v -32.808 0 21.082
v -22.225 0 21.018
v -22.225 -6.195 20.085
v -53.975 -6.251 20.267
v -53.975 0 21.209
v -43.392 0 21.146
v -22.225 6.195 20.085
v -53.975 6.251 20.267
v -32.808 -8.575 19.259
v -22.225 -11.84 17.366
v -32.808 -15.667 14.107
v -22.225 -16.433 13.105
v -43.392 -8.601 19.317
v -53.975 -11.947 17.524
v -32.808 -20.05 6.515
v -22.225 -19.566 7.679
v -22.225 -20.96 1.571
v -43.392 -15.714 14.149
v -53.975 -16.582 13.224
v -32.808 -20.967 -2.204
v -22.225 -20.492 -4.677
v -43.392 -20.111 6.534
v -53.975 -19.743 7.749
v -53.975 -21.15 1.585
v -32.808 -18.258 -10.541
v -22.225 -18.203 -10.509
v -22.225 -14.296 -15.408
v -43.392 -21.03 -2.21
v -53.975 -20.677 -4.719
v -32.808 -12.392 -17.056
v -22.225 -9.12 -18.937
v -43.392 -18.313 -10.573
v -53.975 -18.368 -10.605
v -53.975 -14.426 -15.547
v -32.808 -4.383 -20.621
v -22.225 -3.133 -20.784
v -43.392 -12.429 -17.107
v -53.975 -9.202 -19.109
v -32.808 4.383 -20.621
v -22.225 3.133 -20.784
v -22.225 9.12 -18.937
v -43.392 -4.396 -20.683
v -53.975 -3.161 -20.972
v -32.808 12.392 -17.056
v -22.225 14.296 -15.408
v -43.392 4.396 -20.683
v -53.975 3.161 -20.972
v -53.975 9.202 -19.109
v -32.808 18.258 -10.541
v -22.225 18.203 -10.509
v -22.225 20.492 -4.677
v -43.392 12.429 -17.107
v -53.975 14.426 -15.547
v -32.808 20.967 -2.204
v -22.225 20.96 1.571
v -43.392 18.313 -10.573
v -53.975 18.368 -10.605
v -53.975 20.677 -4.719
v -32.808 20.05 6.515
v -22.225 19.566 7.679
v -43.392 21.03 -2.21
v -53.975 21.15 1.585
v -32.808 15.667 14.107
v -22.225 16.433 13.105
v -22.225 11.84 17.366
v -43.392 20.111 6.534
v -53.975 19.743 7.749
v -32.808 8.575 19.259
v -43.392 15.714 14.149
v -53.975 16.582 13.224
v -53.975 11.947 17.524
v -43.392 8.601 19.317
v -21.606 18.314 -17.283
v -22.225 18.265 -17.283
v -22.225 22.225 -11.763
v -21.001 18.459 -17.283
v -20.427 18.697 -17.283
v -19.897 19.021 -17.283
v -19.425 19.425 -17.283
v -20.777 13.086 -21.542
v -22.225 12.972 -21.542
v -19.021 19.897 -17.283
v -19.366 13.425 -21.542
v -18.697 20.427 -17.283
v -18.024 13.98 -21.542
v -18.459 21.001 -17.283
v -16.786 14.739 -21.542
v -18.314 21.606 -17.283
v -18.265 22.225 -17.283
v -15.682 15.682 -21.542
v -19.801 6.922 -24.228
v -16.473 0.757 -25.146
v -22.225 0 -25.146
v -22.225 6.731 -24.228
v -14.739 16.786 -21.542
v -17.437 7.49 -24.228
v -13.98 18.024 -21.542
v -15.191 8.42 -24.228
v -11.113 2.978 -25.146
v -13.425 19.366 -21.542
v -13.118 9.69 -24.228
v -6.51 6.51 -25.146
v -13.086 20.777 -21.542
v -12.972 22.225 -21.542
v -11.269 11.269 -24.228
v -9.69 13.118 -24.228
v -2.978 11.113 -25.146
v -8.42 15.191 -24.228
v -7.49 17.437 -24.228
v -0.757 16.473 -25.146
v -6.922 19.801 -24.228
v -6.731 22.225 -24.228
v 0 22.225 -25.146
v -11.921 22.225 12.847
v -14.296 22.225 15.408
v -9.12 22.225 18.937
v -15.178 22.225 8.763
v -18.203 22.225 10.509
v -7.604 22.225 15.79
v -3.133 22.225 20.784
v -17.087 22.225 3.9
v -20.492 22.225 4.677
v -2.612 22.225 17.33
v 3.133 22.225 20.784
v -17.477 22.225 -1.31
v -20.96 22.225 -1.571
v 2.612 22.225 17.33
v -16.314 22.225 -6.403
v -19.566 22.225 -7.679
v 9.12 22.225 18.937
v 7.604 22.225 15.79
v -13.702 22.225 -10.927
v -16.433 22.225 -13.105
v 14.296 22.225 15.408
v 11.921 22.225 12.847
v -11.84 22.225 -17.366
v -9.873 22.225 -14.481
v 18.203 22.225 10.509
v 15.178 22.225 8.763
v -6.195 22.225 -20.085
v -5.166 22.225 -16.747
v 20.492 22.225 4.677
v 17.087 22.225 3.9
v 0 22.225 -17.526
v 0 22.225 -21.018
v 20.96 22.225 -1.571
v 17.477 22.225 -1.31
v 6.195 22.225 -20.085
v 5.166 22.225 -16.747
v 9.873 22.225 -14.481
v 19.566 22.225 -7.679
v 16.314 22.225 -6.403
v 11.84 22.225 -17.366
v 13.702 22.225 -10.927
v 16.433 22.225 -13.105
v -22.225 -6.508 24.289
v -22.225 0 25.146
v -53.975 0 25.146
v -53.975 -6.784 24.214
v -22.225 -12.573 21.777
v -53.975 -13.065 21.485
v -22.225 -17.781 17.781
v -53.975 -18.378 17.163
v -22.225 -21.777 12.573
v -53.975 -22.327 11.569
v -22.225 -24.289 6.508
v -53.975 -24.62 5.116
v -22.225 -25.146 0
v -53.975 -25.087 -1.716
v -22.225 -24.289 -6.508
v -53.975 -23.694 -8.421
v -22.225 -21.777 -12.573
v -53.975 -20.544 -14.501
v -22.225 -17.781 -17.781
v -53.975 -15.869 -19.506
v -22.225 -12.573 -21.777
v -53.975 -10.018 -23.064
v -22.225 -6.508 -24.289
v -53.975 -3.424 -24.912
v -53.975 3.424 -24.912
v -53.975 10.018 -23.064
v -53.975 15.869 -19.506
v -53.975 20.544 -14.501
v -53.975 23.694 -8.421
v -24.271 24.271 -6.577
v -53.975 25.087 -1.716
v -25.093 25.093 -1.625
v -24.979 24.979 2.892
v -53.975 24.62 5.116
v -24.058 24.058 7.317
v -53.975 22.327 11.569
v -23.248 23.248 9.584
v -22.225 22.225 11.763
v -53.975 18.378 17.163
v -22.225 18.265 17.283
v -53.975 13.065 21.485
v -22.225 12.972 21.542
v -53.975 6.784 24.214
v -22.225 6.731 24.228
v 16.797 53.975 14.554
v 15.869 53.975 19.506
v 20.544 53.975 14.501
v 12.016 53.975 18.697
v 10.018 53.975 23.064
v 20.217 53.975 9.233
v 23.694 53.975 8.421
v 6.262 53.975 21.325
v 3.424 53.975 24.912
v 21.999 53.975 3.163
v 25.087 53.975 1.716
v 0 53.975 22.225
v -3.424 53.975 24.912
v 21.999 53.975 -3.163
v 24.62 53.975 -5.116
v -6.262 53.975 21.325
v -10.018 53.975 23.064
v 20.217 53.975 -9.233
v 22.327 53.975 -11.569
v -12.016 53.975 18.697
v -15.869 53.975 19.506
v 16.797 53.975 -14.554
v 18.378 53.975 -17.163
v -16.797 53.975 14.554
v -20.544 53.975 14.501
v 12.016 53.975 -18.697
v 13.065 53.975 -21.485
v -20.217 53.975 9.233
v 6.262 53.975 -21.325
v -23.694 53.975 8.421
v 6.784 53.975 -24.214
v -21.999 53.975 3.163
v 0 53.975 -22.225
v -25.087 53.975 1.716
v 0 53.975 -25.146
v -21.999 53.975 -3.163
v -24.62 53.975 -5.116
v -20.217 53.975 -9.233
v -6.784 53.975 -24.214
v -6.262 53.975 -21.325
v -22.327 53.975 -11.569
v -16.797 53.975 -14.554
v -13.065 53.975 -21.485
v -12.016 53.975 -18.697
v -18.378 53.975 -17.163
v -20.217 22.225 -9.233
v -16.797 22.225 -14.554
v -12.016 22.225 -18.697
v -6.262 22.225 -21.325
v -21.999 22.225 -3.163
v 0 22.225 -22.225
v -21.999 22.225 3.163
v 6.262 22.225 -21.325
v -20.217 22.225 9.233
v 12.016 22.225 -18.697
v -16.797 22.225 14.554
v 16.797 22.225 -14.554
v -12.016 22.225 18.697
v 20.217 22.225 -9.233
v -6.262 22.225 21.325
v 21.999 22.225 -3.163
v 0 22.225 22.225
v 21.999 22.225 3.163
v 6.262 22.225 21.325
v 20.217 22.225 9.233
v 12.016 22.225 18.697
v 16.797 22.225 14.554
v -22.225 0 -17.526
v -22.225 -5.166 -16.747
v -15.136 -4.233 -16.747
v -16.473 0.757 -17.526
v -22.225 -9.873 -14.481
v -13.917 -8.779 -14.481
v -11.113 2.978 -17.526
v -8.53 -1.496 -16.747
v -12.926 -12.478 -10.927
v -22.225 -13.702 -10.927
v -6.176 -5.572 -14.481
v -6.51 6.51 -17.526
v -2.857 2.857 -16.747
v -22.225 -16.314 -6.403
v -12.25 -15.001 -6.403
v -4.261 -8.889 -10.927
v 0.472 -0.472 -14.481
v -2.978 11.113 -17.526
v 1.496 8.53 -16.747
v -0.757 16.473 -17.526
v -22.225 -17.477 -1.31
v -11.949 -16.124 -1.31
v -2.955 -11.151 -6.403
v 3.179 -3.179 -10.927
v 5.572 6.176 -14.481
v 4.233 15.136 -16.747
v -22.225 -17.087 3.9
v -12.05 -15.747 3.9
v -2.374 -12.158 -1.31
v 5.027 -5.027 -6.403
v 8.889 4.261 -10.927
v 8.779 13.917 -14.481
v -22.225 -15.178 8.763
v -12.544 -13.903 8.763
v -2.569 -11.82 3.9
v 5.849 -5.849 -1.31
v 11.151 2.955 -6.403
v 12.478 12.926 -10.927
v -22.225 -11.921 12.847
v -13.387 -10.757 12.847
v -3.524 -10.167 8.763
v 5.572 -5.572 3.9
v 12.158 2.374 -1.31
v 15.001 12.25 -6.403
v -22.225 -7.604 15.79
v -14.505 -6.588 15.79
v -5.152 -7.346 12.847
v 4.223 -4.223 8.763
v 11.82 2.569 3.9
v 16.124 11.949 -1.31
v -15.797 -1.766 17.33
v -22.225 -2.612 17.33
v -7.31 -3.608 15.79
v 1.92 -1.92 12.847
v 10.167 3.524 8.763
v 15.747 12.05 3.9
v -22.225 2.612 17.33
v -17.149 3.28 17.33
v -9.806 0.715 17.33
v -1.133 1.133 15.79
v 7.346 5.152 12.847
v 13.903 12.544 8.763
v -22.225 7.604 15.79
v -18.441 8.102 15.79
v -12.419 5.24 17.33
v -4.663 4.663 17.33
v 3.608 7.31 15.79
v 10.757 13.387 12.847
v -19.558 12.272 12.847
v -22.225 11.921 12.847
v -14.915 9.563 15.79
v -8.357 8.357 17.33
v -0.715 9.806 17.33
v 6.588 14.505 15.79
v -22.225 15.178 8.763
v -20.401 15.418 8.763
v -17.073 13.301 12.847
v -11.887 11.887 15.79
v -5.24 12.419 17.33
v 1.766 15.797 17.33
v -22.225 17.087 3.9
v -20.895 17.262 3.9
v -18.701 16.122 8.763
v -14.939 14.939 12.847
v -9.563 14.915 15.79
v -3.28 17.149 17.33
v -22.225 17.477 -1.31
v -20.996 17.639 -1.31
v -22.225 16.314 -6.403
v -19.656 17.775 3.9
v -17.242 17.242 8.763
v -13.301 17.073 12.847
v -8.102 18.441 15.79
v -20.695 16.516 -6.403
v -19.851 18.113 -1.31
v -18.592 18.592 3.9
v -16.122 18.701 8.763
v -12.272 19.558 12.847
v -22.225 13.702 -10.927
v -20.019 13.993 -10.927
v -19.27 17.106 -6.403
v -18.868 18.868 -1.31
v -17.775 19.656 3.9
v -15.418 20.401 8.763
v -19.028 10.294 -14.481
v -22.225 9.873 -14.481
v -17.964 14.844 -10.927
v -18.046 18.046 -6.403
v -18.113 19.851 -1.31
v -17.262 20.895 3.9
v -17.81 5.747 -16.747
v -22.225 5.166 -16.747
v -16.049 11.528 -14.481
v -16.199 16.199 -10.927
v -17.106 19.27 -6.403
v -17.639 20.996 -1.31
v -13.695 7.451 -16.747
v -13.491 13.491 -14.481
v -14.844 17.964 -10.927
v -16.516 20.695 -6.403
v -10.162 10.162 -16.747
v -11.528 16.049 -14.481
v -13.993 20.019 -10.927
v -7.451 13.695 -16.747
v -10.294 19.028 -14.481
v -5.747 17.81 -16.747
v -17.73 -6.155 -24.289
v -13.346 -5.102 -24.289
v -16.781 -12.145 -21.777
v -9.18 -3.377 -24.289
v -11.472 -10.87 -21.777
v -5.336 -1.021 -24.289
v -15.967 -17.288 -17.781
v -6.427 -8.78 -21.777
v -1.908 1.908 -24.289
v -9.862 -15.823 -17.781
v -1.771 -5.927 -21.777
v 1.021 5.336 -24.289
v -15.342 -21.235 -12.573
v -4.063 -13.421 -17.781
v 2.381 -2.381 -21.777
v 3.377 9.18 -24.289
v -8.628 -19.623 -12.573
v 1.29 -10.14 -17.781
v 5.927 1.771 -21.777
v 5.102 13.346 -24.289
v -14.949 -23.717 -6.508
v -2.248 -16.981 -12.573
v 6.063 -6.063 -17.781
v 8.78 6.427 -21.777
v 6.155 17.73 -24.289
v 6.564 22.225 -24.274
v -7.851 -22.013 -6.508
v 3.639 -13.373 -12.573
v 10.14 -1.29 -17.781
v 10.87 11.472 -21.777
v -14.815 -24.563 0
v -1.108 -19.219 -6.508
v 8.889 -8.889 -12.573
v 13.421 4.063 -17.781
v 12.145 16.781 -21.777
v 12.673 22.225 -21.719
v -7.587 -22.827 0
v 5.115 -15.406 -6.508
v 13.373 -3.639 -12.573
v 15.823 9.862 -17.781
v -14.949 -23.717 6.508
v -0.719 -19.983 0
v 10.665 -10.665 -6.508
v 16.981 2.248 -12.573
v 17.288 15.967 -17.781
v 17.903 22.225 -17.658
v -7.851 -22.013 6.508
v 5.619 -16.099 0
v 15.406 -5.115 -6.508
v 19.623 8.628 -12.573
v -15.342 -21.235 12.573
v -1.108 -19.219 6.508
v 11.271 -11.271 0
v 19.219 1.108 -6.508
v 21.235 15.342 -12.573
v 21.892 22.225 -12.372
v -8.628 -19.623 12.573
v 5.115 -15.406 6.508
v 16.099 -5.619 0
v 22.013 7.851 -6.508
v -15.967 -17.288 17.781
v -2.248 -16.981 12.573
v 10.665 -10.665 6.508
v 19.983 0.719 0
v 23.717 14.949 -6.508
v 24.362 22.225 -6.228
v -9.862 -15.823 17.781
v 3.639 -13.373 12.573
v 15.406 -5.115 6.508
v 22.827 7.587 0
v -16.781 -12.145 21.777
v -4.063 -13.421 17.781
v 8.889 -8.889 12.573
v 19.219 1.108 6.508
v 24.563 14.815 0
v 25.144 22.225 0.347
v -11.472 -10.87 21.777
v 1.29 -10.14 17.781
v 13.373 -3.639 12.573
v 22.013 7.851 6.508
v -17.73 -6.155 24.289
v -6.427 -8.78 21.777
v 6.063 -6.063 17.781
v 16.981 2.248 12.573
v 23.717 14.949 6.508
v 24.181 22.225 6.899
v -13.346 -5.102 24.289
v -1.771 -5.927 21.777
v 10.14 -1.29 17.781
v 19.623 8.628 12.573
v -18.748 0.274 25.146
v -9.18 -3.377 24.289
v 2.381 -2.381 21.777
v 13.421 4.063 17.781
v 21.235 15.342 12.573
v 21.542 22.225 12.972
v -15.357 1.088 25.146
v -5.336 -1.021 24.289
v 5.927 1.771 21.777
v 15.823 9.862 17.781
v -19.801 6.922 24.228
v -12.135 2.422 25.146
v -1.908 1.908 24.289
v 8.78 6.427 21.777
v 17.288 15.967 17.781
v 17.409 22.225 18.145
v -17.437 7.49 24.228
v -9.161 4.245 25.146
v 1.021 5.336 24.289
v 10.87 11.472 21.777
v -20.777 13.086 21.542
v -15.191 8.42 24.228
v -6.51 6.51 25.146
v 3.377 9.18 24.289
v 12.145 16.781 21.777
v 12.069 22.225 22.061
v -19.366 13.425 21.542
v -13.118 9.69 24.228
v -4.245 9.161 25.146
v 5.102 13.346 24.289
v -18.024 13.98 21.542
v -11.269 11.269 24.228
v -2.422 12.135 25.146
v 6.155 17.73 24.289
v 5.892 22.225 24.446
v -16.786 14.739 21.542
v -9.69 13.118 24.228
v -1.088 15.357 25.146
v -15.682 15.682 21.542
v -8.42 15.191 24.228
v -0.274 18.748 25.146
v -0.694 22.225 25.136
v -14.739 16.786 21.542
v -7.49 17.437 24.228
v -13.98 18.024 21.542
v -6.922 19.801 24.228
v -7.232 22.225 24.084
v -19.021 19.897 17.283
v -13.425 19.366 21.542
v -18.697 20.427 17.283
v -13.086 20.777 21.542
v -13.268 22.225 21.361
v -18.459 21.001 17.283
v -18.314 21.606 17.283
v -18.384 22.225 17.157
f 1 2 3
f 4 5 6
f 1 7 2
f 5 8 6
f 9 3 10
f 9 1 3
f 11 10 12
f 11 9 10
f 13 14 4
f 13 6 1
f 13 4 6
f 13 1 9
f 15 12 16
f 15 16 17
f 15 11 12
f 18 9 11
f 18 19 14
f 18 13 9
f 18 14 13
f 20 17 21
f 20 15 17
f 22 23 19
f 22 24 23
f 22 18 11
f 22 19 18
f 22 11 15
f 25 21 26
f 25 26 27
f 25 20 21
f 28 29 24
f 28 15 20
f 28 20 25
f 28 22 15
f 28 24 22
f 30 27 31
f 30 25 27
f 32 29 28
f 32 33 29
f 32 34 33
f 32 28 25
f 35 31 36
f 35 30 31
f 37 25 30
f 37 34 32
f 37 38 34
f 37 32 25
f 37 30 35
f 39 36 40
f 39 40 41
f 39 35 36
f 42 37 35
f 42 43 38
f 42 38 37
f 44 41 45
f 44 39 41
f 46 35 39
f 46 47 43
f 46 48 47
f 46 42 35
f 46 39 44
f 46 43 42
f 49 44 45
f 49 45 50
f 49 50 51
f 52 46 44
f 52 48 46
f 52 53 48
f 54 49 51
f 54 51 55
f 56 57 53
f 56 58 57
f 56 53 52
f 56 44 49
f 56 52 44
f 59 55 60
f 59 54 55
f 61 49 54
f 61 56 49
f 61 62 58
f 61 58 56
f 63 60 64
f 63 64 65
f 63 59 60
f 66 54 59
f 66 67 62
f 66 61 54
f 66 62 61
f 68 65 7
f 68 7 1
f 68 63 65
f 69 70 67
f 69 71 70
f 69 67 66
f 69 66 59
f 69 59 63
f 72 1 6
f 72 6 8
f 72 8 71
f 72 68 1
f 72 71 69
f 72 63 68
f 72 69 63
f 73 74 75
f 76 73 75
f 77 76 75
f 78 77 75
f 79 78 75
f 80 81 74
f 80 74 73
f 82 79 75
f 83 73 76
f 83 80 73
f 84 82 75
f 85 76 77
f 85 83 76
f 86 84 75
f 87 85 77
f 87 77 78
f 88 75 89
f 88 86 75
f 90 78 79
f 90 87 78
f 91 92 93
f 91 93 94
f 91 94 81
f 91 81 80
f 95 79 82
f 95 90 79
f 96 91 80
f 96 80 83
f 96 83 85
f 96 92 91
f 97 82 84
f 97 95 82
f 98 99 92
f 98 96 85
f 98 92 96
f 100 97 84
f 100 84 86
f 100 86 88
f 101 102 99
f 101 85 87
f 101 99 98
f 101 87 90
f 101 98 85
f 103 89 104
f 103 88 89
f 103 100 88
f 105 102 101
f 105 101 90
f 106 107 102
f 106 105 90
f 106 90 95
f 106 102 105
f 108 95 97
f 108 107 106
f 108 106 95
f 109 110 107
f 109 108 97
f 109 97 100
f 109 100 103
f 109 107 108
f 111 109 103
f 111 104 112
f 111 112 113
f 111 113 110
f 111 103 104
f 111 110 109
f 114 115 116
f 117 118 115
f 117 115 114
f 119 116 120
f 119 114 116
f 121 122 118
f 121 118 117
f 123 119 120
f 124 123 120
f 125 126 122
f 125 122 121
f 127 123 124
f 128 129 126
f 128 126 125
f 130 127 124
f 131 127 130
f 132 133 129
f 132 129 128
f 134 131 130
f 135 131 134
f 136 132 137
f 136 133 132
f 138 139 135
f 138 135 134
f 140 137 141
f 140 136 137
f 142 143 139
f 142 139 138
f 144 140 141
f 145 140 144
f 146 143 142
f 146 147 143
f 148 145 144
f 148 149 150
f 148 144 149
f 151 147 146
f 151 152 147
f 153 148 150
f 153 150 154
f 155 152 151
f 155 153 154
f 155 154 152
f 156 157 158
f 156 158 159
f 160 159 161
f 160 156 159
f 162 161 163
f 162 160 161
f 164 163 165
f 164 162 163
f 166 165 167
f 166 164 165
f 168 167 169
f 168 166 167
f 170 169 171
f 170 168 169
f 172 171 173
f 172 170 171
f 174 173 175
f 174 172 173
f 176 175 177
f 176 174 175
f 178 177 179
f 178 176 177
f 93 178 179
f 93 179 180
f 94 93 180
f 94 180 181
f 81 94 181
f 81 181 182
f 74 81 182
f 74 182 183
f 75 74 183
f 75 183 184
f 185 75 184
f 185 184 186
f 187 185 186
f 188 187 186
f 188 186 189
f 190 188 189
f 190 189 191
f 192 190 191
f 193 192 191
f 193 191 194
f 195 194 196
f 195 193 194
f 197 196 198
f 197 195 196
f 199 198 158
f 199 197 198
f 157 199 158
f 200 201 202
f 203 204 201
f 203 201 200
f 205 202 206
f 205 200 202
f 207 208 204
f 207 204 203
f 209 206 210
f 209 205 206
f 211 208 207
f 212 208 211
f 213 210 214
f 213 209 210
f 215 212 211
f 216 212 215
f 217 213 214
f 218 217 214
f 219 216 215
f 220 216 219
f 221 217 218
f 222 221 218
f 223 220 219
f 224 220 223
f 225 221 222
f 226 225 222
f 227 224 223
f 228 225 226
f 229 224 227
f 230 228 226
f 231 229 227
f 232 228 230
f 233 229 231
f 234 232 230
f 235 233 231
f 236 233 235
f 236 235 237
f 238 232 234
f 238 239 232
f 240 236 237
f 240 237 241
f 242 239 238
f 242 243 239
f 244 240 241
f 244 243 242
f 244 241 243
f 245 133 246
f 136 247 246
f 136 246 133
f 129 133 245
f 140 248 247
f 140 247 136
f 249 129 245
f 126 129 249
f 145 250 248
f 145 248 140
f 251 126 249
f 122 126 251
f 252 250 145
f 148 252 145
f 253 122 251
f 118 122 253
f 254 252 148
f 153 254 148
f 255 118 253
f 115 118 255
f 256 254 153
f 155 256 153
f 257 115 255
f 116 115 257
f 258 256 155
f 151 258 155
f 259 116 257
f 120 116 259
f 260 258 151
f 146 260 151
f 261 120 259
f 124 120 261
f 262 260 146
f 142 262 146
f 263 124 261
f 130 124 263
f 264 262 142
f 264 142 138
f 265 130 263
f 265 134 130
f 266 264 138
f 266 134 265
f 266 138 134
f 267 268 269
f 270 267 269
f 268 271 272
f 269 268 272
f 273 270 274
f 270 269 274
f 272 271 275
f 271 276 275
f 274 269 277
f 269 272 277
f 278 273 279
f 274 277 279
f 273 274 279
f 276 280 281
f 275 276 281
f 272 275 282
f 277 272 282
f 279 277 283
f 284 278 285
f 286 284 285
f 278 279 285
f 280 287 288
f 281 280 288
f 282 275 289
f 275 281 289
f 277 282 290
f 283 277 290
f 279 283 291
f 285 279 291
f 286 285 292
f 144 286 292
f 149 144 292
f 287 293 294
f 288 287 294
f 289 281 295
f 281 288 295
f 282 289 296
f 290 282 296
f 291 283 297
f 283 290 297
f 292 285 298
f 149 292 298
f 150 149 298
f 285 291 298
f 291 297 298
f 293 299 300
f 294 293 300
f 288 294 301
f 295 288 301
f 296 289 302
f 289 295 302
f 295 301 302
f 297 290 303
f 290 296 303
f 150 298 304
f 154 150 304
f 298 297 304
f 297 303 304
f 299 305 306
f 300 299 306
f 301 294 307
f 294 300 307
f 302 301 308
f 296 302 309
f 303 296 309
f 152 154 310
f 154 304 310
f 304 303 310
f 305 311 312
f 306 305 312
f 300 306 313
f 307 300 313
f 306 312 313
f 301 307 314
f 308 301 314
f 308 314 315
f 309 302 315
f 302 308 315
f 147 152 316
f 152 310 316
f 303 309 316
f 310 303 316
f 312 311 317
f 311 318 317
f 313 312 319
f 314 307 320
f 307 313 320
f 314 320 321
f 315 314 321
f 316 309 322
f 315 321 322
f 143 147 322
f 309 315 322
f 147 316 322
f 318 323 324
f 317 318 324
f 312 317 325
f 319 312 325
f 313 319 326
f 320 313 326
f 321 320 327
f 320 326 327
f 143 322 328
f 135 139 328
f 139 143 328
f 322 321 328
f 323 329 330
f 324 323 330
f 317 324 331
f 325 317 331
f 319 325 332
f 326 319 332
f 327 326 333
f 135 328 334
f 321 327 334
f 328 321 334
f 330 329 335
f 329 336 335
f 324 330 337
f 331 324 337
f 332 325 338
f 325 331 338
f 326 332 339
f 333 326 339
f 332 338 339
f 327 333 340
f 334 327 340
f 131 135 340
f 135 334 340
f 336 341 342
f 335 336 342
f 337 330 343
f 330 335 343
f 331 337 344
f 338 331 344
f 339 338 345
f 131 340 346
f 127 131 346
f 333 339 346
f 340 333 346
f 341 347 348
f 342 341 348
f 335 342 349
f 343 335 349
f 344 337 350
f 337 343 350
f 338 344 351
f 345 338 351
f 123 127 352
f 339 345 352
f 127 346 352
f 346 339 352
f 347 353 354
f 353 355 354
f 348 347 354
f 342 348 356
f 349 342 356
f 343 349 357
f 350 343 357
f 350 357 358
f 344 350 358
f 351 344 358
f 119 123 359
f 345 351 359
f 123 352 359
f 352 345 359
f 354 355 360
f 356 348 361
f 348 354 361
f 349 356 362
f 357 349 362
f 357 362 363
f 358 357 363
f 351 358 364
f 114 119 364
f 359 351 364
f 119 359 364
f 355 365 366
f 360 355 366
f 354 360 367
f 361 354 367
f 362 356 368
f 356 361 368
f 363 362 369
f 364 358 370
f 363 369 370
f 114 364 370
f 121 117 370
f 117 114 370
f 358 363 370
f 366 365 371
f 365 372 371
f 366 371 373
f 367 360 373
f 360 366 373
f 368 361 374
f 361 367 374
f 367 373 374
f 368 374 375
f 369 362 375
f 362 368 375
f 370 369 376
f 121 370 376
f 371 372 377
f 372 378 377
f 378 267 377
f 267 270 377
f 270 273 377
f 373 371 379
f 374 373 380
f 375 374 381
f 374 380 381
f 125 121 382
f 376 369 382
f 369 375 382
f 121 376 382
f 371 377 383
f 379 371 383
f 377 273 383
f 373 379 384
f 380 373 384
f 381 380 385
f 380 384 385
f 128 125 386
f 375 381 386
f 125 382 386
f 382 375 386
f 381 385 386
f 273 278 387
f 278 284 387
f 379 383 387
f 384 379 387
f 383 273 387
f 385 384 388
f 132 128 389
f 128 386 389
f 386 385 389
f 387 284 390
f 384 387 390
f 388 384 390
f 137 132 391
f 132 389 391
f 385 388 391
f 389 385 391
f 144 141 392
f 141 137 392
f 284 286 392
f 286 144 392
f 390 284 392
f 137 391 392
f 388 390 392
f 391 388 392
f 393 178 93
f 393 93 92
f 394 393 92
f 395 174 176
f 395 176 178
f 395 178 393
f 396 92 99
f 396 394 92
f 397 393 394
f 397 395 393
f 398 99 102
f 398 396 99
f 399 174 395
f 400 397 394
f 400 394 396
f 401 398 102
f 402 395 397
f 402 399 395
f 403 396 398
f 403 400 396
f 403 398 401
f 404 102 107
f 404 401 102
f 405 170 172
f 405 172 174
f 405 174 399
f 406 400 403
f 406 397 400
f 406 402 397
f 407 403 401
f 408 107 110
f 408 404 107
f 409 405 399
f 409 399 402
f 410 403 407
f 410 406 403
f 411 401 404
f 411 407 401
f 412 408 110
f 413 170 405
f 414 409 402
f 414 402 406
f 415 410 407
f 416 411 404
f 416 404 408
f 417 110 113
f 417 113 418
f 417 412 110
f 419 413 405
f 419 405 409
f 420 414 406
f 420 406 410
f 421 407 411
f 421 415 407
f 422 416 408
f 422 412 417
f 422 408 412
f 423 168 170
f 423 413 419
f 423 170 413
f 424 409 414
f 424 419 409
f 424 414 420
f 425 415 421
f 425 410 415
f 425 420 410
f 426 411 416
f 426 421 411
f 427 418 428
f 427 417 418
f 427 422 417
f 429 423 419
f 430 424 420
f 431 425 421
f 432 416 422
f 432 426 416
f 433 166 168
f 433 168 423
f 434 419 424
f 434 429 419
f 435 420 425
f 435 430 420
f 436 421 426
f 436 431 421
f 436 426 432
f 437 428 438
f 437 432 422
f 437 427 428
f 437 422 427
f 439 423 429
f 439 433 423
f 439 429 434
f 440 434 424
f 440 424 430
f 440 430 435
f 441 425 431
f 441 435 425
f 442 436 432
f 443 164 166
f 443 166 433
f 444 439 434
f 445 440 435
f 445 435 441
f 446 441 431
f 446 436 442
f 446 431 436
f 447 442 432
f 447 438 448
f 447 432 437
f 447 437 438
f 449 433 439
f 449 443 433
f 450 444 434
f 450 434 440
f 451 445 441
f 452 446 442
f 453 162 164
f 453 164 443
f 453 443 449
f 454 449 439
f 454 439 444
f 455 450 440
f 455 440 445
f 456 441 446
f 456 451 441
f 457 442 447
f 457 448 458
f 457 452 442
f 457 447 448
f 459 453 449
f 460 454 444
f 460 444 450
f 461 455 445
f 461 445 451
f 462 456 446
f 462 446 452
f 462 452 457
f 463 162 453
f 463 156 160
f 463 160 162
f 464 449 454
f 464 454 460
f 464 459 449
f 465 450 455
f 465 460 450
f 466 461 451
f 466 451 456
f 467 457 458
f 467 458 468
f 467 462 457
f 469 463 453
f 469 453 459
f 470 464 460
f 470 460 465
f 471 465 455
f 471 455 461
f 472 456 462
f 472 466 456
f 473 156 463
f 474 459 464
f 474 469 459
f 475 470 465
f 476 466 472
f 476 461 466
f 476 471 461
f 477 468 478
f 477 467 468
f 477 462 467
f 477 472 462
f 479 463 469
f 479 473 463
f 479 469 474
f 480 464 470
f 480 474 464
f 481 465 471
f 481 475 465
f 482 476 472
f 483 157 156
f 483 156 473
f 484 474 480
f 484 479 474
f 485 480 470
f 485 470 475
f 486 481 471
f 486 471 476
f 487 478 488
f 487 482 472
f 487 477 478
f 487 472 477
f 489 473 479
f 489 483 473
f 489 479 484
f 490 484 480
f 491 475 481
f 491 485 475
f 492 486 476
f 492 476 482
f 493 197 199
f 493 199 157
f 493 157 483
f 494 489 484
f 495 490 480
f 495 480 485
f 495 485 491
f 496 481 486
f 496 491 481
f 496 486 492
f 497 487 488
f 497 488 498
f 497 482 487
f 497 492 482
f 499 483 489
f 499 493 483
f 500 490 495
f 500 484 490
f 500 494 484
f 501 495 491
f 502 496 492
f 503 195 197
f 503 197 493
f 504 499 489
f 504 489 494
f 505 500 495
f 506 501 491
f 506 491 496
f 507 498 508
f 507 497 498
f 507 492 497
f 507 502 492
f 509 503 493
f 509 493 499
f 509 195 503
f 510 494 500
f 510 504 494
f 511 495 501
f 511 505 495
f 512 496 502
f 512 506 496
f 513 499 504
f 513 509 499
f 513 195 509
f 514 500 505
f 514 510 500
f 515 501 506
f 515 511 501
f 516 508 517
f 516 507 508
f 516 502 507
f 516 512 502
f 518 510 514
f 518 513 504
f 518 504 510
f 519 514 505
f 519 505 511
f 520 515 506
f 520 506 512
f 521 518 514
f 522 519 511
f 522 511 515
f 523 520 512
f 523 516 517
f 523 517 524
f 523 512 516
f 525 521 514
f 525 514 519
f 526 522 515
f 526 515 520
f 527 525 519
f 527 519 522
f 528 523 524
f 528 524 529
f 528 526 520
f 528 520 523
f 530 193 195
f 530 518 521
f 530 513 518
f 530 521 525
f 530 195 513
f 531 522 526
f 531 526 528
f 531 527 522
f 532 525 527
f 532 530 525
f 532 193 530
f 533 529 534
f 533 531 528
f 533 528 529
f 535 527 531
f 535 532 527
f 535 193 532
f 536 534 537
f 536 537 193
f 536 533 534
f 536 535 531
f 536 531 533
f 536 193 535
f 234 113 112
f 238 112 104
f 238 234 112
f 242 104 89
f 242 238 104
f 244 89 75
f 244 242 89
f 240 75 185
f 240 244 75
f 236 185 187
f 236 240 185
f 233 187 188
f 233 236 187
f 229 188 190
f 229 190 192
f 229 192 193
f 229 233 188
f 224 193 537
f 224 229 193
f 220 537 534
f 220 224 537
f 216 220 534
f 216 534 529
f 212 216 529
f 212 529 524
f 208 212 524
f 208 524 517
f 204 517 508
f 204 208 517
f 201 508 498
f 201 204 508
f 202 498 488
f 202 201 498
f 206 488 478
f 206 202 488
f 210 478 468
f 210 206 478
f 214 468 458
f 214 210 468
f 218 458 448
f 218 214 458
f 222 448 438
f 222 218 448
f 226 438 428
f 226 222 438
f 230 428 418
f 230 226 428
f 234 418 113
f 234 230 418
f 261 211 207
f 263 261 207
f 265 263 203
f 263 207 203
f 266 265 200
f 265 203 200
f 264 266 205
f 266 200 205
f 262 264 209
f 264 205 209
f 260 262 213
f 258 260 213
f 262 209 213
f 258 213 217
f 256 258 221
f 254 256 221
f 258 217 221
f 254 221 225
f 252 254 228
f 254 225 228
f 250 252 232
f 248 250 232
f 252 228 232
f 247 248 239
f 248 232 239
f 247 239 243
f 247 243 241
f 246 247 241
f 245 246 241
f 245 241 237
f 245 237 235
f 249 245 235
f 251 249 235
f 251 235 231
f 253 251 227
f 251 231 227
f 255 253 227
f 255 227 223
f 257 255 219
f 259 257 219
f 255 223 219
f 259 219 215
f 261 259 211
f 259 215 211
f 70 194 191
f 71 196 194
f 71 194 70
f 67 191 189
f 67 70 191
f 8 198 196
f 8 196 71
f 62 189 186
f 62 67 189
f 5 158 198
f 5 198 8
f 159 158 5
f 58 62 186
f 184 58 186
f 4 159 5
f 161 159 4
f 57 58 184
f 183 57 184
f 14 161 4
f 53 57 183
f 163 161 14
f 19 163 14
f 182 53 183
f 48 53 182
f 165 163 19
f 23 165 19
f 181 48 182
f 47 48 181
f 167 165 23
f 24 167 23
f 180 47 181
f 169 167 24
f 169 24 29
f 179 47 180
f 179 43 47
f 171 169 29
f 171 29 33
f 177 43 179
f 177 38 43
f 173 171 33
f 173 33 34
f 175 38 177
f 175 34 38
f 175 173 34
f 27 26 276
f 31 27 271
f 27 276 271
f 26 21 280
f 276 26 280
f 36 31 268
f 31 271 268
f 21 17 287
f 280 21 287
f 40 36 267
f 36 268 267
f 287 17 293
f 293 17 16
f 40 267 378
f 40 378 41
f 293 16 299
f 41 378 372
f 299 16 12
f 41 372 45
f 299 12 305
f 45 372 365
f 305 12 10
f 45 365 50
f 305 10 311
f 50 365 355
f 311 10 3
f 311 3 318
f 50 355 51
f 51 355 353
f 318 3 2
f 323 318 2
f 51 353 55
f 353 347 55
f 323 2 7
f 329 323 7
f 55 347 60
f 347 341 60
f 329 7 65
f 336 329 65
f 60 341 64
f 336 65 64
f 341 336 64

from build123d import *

# Parameters (mm, degrees)
SKETCH3_R          = 25.146
SKETCH3_R_2        = 17.526
SKETCH5_R          = 22.225
CUT_EXTRUDE1_DEPTH = 31.75


with BuildPart() as part:
    # Sketch1 → Revolve1 (revolve)
    with BuildSketch(Plane.XY):
        Polygon((-53.975, -25.146), (-22.225, -25.146), (-22.225, -21.0185), (-53.975, -21.209), align=None)
    revolve(axis=Axis((-53.975, 0, 0), (1, 0, 0)))


with BuildPart() as body_2:
    # Sketch2 → Revolve2 (revolve)
    with BuildSketch(Plane.XY):
        Polygon((21.209, 53.975), (21.0185, 22.225), (25.146, 22.225), (25.146, 53.975), align=None)
    revolve(axis=Axis((0, 0, 0), (0, 1, 0)))


with BuildPart() as sweep1_tool:
    # Sweep1: sweep along a path in Sketch4
    with BuildLine(Plane.XY) as sweep1_path:
        ThreePointArc((-22.225, 0), (-6.509552, 6.509552), (0, 22.225))
    # Sketch3 → Sweep1 (sweep)
    with BuildSketch(Plane(origin=(-22.225, 0, 0), x_dir=(0, 0, -1), z_dir=(1, 0, 0))):
        Circle(SKETCH3_R)
        Circle(SKETCH3_R_2, mode=Mode.SUBTRACT)
    sweep(path=sweep1_path.line)


with BuildPart() as part_1:
    add(part.part)


with BuildPart() as part_2:
    # Sweep1: joined with sweep1_tool
    add(part_1.part.fuse(sweep1_tool.part, body_2.part, tol=0.00001))

    # Sketch5 → Cut-Extrude1 (cut)
    with BuildSketch(Plane(origin=(0, 53.975, 0), x_dir=(1, 0, 0), z_dir=(0, 1, 0))):
        Circle(SKETCH5_R)
    extrude(amount=-CUT_EXTRUDE1_DEPTH, mode=Mode.SUBTRACT)


solid = part_2.part
